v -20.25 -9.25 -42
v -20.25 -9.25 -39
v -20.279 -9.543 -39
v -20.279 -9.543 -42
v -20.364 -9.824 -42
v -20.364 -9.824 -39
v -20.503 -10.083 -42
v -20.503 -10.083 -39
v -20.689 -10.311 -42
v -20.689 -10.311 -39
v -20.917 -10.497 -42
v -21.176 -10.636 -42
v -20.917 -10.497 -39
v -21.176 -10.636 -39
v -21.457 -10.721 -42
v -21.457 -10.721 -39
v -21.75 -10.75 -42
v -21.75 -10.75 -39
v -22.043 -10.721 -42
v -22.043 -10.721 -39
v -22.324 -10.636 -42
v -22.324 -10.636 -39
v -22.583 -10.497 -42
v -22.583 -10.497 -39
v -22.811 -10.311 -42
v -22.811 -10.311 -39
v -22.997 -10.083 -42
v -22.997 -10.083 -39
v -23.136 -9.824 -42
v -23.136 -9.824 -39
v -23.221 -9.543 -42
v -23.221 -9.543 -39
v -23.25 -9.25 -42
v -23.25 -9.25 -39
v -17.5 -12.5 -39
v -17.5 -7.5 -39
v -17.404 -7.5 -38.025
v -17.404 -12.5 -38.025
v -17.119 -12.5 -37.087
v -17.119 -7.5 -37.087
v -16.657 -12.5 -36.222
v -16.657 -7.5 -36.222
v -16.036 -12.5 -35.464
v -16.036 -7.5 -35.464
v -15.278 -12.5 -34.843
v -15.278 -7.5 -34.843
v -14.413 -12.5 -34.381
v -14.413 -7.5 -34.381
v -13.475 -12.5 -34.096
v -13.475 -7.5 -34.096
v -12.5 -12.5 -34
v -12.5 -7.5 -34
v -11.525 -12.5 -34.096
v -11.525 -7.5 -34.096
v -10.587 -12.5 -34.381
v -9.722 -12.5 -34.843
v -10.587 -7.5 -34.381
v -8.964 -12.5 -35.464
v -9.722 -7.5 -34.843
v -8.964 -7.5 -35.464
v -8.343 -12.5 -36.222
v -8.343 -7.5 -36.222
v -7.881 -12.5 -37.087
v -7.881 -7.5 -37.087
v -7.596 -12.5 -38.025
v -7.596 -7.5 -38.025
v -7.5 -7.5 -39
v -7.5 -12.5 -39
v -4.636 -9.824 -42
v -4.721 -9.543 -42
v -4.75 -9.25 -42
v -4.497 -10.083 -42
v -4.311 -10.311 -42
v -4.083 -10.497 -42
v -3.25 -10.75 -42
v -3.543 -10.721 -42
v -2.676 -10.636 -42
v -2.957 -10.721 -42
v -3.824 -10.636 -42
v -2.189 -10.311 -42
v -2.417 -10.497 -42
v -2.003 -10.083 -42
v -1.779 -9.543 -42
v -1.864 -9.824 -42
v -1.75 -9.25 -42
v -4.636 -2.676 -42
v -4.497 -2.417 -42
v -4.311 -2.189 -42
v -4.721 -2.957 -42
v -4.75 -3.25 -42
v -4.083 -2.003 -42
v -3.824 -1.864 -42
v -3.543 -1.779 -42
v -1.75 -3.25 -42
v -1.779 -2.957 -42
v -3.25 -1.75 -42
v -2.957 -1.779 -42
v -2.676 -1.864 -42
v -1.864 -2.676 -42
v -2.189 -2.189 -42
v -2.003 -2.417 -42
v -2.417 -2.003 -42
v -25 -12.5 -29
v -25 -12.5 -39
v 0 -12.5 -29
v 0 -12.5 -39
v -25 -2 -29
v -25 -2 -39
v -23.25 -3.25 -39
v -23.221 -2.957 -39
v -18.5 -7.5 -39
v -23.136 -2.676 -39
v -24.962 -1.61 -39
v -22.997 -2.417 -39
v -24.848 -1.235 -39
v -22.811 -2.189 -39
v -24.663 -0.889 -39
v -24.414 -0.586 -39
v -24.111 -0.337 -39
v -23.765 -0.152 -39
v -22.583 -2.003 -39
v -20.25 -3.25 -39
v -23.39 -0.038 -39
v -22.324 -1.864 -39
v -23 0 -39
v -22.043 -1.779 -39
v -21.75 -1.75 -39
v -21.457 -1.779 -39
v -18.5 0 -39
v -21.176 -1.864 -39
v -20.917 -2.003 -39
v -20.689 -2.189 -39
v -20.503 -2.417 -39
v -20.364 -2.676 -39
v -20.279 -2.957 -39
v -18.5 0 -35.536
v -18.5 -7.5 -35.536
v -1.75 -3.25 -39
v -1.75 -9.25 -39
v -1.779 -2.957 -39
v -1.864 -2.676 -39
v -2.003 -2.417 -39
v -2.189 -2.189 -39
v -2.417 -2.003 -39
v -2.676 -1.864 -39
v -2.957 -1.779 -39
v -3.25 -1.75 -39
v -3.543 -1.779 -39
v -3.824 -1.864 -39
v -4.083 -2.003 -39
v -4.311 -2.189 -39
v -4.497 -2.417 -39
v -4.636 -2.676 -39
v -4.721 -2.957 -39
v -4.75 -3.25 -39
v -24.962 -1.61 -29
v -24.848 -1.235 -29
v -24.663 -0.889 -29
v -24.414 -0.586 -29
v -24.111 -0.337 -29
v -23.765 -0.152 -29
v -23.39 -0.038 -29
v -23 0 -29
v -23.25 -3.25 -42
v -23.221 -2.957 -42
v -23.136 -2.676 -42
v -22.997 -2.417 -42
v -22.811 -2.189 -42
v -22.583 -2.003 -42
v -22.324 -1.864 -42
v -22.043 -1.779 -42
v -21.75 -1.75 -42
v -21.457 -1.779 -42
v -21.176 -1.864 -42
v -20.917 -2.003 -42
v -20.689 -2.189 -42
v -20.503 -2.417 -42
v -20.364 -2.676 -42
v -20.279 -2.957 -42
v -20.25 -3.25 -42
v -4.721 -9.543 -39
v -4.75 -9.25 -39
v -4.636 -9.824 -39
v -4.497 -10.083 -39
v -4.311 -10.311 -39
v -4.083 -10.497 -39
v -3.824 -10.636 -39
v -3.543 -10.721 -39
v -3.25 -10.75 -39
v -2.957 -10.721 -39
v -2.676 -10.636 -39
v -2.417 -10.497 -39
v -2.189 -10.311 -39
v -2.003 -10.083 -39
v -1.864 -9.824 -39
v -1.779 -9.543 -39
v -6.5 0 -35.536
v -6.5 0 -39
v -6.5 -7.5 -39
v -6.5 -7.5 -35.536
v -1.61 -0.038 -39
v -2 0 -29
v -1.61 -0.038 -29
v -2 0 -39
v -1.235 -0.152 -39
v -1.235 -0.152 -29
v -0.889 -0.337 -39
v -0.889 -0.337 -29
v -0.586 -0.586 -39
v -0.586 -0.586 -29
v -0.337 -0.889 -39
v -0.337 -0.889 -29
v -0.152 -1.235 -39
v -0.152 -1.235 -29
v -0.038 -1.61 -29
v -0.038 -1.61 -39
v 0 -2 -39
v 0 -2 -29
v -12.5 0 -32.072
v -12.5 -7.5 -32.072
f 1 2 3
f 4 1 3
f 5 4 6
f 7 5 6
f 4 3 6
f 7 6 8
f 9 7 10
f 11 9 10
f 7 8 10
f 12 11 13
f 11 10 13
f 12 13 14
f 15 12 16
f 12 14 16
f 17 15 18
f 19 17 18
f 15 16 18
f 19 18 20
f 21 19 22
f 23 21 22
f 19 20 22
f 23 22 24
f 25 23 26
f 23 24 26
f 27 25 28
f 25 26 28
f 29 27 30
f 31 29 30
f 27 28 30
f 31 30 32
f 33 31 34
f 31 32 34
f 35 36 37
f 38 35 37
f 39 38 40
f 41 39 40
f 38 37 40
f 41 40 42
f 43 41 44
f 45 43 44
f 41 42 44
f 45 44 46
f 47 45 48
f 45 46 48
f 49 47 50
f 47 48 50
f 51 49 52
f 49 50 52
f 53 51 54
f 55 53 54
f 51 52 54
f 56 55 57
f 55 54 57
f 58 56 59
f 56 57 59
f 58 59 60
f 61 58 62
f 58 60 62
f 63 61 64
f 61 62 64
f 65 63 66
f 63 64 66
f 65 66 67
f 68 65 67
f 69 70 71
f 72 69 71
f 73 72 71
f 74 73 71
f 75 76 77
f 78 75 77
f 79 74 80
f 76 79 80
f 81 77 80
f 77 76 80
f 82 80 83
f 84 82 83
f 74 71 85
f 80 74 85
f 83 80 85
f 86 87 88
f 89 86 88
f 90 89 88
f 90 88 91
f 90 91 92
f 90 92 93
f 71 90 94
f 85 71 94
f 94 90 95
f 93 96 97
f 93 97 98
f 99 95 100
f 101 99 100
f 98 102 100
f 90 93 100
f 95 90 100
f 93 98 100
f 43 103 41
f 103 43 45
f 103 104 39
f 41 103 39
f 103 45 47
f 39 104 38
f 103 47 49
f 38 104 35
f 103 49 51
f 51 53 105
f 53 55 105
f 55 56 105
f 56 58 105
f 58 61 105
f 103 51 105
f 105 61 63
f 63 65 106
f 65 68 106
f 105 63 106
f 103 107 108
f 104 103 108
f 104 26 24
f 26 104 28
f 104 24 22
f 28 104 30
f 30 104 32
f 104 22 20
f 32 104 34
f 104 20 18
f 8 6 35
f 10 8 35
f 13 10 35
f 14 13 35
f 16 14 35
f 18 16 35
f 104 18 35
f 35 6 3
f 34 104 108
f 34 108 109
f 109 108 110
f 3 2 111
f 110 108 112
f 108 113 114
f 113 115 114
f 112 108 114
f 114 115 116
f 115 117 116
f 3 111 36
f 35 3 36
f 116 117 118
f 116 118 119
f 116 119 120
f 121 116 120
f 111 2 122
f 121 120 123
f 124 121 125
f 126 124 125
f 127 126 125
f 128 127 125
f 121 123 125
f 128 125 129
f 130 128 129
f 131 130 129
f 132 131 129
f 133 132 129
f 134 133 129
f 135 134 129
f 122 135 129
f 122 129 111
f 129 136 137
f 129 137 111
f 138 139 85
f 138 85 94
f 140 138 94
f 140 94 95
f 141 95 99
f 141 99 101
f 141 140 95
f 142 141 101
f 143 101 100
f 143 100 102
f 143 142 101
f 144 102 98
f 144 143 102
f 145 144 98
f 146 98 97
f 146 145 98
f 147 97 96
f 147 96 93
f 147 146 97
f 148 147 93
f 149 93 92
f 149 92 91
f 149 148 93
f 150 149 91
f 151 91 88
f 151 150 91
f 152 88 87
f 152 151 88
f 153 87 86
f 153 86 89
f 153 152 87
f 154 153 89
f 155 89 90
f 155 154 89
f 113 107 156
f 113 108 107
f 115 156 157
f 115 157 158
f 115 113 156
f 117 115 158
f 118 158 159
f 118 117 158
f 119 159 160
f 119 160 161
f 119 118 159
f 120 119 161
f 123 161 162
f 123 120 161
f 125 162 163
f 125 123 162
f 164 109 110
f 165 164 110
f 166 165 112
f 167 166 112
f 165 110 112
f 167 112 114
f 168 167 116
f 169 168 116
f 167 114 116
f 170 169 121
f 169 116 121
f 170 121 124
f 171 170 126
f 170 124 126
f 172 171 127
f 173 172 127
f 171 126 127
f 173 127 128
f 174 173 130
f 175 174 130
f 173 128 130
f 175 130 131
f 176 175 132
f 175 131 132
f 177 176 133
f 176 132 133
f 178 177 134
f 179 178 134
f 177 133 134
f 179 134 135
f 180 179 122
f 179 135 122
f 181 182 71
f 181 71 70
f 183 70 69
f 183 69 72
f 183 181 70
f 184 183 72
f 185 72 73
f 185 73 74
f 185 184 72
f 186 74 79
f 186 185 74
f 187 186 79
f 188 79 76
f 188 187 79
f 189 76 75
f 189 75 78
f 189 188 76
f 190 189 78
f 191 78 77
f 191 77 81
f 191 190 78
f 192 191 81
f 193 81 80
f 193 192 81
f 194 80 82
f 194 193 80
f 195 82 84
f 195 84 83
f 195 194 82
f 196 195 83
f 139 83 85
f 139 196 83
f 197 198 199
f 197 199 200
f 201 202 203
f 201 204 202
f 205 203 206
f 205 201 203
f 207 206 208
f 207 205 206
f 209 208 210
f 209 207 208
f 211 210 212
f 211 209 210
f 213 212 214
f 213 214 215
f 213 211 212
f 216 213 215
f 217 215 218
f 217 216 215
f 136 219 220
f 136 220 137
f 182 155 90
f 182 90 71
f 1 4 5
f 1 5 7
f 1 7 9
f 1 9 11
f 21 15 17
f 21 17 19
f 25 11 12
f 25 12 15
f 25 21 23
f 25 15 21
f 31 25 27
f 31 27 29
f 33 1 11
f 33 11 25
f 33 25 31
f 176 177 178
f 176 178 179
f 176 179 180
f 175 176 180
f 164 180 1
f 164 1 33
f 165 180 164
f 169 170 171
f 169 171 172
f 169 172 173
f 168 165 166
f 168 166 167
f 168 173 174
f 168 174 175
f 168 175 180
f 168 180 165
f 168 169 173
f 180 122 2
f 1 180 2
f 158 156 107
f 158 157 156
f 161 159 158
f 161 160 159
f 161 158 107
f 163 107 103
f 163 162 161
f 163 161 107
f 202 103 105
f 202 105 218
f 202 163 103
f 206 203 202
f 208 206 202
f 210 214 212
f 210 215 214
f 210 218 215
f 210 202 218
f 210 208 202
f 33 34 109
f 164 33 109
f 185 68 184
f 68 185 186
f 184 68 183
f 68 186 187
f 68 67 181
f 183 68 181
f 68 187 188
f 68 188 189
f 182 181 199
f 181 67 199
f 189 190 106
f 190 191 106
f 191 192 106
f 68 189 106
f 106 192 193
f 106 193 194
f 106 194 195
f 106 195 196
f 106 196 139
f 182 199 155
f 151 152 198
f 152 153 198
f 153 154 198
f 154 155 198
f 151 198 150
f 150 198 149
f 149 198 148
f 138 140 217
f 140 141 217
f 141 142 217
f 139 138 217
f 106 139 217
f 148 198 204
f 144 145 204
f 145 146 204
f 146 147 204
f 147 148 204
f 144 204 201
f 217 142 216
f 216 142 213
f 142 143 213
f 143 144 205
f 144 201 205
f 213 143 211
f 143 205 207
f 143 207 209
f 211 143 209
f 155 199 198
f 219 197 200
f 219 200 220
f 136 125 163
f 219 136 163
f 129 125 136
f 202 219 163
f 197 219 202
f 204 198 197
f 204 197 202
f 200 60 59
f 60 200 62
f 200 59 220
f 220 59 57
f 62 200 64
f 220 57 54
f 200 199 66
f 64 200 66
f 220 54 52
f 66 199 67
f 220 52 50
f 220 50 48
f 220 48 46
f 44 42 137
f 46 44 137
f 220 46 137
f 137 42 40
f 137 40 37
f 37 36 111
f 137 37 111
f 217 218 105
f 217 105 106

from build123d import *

# Parameters (mm, degrees)
BOSS_EXTRU_1_DEPTH      = 12.5
BOSS_EXTRU_1_DEPTH_BACK = 12.5
ESQUISSE3_W             = 25
ESQUISSE3_H             = 10
BOSS_EXTRU_2_DEPTH      = 12.5
ENL_V_MAT_EXTRU_3_DEPTH = 7.5
ESQUISSE5_R             = 5
ENL_V_MAT_EXTRU_4_DEPTH = 77.746335417
ESQUISSE6_W             = 73.841898386
ESQUISSE6_H             = 62.78176119
ENL_V_MAT_EXTRU_5_DEPTH = 79.198465458
BOSS_EXTRU_3_DEPTH      = 3
CONG_1_R                = 2


with BuildPart() as part:
    # Esquisse1 → Boss.-Extru.1 (new, two sides: drawn at the far end of the back side and taken through both)
    with BuildSketch(Plane(origin=(0, 0, 0), x_dir=(1, 0, 0), z_dir=(0, 1, 0)).offset(-BOSS_EXTRU_1_DEPTH_BACK)):
        with BuildLine():
            ThreePointArc((-8, 26), (-4.464466094, 24.535533906), (-3, 21))
            Line((-3, 21), (-3, -21))
            ThreePointArc((-3, -21), (-4.464466094, -24.535533906), (-8, -26))
            Line((-8, -26), (-63, -26))
            Line((-63, -26), (-63, -29))
            Line((-63, -29), (-3, -29))
            Line((-3, -29), (0, -29))
            Line((0, -29), (0, 29))
            Line((0, 29), (-3, 29))
            Line((-3, 29), (-63, 29))
            Line((-63, 29), (-63, 26))
            Line((-63, 26), (-8, 26))
        make_face()
    extrude(amount=BOSS_EXTRU_1_DEPTH + BOSS_EXTRU_1_DEPTH_BACK)

    # Esquisse3 → Boss.-Extru.2 (add)
    with BuildSketch(Plane(origin=(0, 0, 0), x_dir=(1, 0, 0), z_dir=(0, 1, 0))):
        with Locations((-12.5, 34)):
            Rectangle(ESQUISSE3_W, ESQUISSE3_H)
    extrude(amount=-BOSS_EXTRU_2_DEPTH)

    # Esquisse4 → Enlèv. mat.-Extru.3 (cut)
    with BuildSketch(Plane(origin=(0, 0, 0), x_dir=(1, 0, 0), z_dir=(0, 1, 0))):
        Polygon((-18.5, 39), (-6.5, 44), (-6.5, 35.535898385), (-12.5, 32.07179677), (-18.5, 35.535898385), align=None)
    extrude(amount=-ENL_V_MAT_EXTRU_3_DEPTH, mode=Mode.SUBTRACT)

    # Esquisse5 → Enlèv. mat.-Extru.4 (cut, through all)
    with BuildSketch(Plane(origin=(0, -7.5, 0), x_dir=(1, 0, 0), z_dir=(0, 1, 0))):
        with Locations((-12.5, 39)):
            Circle(ESQUISSE5_R)
    extrude(amount=-ENL_V_MAT_EXTRU_4_DEPTH, mode=Mode.SUBTRACT)

    # Esquisse6 → Enlèv. mat.-Extru.5 (cut, through all)
    with BuildSketch(Plane(origin=(0, 12.5, 0), x_dir=(1, 0, 0), z_dir=(0, 1, 0))):
        with Locations((-26.079050807, -2.390880595)):
            Rectangle(ESQUISSE6_W, ESQUISSE6_H)
    extrude(amount=-ENL_V_MAT_EXTRU_5_DEPTH, mode=Mode.SUBTRACT)

    # Esquisse7 → Boss.-Extru.3 (add)
    with BuildSketch(Plane(origin=(0, 0, -39), x_dir=(-1, 0, 0), z_dir=(0, 0, -1))):
        with BuildLine():
            Line((4.75, -3.25), (4.75, -9.25))
            ThreePointArc((4.75, -9.25), (3.25, -10.75), (1.75, -9.25))
            Line((1.75, -9.25), (1.75, -3.25))
            ThreePointArc((1.75, -3.25), (3.25, -1.75), (4.75, -3.25))
        make_face()
        with BuildLine():
            Line((20.25, -3.25), (20.25, -9.25))
            ThreePointArc((20.25, -9.25), (21.75, -10.75), (23.25, -9.25))
            Line((23.25, -9.25), (23.25, -3.25))
            ThreePointArc((23.25, -3.25), (21.75, -1.75), (20.25, -3.25))
        make_face()
    extrude(amount=BOSS_EXTRU_3_DEPTH)

    # Congé1
    cong_1_edges = [part.edges().sort_by_distance(p)[0] for p in [
        (0, 0, -34),
        (-25, 0, -34),
    ]]
    fillet(cong_1_edges, radius=CONG_1_R)


solid = part.part
